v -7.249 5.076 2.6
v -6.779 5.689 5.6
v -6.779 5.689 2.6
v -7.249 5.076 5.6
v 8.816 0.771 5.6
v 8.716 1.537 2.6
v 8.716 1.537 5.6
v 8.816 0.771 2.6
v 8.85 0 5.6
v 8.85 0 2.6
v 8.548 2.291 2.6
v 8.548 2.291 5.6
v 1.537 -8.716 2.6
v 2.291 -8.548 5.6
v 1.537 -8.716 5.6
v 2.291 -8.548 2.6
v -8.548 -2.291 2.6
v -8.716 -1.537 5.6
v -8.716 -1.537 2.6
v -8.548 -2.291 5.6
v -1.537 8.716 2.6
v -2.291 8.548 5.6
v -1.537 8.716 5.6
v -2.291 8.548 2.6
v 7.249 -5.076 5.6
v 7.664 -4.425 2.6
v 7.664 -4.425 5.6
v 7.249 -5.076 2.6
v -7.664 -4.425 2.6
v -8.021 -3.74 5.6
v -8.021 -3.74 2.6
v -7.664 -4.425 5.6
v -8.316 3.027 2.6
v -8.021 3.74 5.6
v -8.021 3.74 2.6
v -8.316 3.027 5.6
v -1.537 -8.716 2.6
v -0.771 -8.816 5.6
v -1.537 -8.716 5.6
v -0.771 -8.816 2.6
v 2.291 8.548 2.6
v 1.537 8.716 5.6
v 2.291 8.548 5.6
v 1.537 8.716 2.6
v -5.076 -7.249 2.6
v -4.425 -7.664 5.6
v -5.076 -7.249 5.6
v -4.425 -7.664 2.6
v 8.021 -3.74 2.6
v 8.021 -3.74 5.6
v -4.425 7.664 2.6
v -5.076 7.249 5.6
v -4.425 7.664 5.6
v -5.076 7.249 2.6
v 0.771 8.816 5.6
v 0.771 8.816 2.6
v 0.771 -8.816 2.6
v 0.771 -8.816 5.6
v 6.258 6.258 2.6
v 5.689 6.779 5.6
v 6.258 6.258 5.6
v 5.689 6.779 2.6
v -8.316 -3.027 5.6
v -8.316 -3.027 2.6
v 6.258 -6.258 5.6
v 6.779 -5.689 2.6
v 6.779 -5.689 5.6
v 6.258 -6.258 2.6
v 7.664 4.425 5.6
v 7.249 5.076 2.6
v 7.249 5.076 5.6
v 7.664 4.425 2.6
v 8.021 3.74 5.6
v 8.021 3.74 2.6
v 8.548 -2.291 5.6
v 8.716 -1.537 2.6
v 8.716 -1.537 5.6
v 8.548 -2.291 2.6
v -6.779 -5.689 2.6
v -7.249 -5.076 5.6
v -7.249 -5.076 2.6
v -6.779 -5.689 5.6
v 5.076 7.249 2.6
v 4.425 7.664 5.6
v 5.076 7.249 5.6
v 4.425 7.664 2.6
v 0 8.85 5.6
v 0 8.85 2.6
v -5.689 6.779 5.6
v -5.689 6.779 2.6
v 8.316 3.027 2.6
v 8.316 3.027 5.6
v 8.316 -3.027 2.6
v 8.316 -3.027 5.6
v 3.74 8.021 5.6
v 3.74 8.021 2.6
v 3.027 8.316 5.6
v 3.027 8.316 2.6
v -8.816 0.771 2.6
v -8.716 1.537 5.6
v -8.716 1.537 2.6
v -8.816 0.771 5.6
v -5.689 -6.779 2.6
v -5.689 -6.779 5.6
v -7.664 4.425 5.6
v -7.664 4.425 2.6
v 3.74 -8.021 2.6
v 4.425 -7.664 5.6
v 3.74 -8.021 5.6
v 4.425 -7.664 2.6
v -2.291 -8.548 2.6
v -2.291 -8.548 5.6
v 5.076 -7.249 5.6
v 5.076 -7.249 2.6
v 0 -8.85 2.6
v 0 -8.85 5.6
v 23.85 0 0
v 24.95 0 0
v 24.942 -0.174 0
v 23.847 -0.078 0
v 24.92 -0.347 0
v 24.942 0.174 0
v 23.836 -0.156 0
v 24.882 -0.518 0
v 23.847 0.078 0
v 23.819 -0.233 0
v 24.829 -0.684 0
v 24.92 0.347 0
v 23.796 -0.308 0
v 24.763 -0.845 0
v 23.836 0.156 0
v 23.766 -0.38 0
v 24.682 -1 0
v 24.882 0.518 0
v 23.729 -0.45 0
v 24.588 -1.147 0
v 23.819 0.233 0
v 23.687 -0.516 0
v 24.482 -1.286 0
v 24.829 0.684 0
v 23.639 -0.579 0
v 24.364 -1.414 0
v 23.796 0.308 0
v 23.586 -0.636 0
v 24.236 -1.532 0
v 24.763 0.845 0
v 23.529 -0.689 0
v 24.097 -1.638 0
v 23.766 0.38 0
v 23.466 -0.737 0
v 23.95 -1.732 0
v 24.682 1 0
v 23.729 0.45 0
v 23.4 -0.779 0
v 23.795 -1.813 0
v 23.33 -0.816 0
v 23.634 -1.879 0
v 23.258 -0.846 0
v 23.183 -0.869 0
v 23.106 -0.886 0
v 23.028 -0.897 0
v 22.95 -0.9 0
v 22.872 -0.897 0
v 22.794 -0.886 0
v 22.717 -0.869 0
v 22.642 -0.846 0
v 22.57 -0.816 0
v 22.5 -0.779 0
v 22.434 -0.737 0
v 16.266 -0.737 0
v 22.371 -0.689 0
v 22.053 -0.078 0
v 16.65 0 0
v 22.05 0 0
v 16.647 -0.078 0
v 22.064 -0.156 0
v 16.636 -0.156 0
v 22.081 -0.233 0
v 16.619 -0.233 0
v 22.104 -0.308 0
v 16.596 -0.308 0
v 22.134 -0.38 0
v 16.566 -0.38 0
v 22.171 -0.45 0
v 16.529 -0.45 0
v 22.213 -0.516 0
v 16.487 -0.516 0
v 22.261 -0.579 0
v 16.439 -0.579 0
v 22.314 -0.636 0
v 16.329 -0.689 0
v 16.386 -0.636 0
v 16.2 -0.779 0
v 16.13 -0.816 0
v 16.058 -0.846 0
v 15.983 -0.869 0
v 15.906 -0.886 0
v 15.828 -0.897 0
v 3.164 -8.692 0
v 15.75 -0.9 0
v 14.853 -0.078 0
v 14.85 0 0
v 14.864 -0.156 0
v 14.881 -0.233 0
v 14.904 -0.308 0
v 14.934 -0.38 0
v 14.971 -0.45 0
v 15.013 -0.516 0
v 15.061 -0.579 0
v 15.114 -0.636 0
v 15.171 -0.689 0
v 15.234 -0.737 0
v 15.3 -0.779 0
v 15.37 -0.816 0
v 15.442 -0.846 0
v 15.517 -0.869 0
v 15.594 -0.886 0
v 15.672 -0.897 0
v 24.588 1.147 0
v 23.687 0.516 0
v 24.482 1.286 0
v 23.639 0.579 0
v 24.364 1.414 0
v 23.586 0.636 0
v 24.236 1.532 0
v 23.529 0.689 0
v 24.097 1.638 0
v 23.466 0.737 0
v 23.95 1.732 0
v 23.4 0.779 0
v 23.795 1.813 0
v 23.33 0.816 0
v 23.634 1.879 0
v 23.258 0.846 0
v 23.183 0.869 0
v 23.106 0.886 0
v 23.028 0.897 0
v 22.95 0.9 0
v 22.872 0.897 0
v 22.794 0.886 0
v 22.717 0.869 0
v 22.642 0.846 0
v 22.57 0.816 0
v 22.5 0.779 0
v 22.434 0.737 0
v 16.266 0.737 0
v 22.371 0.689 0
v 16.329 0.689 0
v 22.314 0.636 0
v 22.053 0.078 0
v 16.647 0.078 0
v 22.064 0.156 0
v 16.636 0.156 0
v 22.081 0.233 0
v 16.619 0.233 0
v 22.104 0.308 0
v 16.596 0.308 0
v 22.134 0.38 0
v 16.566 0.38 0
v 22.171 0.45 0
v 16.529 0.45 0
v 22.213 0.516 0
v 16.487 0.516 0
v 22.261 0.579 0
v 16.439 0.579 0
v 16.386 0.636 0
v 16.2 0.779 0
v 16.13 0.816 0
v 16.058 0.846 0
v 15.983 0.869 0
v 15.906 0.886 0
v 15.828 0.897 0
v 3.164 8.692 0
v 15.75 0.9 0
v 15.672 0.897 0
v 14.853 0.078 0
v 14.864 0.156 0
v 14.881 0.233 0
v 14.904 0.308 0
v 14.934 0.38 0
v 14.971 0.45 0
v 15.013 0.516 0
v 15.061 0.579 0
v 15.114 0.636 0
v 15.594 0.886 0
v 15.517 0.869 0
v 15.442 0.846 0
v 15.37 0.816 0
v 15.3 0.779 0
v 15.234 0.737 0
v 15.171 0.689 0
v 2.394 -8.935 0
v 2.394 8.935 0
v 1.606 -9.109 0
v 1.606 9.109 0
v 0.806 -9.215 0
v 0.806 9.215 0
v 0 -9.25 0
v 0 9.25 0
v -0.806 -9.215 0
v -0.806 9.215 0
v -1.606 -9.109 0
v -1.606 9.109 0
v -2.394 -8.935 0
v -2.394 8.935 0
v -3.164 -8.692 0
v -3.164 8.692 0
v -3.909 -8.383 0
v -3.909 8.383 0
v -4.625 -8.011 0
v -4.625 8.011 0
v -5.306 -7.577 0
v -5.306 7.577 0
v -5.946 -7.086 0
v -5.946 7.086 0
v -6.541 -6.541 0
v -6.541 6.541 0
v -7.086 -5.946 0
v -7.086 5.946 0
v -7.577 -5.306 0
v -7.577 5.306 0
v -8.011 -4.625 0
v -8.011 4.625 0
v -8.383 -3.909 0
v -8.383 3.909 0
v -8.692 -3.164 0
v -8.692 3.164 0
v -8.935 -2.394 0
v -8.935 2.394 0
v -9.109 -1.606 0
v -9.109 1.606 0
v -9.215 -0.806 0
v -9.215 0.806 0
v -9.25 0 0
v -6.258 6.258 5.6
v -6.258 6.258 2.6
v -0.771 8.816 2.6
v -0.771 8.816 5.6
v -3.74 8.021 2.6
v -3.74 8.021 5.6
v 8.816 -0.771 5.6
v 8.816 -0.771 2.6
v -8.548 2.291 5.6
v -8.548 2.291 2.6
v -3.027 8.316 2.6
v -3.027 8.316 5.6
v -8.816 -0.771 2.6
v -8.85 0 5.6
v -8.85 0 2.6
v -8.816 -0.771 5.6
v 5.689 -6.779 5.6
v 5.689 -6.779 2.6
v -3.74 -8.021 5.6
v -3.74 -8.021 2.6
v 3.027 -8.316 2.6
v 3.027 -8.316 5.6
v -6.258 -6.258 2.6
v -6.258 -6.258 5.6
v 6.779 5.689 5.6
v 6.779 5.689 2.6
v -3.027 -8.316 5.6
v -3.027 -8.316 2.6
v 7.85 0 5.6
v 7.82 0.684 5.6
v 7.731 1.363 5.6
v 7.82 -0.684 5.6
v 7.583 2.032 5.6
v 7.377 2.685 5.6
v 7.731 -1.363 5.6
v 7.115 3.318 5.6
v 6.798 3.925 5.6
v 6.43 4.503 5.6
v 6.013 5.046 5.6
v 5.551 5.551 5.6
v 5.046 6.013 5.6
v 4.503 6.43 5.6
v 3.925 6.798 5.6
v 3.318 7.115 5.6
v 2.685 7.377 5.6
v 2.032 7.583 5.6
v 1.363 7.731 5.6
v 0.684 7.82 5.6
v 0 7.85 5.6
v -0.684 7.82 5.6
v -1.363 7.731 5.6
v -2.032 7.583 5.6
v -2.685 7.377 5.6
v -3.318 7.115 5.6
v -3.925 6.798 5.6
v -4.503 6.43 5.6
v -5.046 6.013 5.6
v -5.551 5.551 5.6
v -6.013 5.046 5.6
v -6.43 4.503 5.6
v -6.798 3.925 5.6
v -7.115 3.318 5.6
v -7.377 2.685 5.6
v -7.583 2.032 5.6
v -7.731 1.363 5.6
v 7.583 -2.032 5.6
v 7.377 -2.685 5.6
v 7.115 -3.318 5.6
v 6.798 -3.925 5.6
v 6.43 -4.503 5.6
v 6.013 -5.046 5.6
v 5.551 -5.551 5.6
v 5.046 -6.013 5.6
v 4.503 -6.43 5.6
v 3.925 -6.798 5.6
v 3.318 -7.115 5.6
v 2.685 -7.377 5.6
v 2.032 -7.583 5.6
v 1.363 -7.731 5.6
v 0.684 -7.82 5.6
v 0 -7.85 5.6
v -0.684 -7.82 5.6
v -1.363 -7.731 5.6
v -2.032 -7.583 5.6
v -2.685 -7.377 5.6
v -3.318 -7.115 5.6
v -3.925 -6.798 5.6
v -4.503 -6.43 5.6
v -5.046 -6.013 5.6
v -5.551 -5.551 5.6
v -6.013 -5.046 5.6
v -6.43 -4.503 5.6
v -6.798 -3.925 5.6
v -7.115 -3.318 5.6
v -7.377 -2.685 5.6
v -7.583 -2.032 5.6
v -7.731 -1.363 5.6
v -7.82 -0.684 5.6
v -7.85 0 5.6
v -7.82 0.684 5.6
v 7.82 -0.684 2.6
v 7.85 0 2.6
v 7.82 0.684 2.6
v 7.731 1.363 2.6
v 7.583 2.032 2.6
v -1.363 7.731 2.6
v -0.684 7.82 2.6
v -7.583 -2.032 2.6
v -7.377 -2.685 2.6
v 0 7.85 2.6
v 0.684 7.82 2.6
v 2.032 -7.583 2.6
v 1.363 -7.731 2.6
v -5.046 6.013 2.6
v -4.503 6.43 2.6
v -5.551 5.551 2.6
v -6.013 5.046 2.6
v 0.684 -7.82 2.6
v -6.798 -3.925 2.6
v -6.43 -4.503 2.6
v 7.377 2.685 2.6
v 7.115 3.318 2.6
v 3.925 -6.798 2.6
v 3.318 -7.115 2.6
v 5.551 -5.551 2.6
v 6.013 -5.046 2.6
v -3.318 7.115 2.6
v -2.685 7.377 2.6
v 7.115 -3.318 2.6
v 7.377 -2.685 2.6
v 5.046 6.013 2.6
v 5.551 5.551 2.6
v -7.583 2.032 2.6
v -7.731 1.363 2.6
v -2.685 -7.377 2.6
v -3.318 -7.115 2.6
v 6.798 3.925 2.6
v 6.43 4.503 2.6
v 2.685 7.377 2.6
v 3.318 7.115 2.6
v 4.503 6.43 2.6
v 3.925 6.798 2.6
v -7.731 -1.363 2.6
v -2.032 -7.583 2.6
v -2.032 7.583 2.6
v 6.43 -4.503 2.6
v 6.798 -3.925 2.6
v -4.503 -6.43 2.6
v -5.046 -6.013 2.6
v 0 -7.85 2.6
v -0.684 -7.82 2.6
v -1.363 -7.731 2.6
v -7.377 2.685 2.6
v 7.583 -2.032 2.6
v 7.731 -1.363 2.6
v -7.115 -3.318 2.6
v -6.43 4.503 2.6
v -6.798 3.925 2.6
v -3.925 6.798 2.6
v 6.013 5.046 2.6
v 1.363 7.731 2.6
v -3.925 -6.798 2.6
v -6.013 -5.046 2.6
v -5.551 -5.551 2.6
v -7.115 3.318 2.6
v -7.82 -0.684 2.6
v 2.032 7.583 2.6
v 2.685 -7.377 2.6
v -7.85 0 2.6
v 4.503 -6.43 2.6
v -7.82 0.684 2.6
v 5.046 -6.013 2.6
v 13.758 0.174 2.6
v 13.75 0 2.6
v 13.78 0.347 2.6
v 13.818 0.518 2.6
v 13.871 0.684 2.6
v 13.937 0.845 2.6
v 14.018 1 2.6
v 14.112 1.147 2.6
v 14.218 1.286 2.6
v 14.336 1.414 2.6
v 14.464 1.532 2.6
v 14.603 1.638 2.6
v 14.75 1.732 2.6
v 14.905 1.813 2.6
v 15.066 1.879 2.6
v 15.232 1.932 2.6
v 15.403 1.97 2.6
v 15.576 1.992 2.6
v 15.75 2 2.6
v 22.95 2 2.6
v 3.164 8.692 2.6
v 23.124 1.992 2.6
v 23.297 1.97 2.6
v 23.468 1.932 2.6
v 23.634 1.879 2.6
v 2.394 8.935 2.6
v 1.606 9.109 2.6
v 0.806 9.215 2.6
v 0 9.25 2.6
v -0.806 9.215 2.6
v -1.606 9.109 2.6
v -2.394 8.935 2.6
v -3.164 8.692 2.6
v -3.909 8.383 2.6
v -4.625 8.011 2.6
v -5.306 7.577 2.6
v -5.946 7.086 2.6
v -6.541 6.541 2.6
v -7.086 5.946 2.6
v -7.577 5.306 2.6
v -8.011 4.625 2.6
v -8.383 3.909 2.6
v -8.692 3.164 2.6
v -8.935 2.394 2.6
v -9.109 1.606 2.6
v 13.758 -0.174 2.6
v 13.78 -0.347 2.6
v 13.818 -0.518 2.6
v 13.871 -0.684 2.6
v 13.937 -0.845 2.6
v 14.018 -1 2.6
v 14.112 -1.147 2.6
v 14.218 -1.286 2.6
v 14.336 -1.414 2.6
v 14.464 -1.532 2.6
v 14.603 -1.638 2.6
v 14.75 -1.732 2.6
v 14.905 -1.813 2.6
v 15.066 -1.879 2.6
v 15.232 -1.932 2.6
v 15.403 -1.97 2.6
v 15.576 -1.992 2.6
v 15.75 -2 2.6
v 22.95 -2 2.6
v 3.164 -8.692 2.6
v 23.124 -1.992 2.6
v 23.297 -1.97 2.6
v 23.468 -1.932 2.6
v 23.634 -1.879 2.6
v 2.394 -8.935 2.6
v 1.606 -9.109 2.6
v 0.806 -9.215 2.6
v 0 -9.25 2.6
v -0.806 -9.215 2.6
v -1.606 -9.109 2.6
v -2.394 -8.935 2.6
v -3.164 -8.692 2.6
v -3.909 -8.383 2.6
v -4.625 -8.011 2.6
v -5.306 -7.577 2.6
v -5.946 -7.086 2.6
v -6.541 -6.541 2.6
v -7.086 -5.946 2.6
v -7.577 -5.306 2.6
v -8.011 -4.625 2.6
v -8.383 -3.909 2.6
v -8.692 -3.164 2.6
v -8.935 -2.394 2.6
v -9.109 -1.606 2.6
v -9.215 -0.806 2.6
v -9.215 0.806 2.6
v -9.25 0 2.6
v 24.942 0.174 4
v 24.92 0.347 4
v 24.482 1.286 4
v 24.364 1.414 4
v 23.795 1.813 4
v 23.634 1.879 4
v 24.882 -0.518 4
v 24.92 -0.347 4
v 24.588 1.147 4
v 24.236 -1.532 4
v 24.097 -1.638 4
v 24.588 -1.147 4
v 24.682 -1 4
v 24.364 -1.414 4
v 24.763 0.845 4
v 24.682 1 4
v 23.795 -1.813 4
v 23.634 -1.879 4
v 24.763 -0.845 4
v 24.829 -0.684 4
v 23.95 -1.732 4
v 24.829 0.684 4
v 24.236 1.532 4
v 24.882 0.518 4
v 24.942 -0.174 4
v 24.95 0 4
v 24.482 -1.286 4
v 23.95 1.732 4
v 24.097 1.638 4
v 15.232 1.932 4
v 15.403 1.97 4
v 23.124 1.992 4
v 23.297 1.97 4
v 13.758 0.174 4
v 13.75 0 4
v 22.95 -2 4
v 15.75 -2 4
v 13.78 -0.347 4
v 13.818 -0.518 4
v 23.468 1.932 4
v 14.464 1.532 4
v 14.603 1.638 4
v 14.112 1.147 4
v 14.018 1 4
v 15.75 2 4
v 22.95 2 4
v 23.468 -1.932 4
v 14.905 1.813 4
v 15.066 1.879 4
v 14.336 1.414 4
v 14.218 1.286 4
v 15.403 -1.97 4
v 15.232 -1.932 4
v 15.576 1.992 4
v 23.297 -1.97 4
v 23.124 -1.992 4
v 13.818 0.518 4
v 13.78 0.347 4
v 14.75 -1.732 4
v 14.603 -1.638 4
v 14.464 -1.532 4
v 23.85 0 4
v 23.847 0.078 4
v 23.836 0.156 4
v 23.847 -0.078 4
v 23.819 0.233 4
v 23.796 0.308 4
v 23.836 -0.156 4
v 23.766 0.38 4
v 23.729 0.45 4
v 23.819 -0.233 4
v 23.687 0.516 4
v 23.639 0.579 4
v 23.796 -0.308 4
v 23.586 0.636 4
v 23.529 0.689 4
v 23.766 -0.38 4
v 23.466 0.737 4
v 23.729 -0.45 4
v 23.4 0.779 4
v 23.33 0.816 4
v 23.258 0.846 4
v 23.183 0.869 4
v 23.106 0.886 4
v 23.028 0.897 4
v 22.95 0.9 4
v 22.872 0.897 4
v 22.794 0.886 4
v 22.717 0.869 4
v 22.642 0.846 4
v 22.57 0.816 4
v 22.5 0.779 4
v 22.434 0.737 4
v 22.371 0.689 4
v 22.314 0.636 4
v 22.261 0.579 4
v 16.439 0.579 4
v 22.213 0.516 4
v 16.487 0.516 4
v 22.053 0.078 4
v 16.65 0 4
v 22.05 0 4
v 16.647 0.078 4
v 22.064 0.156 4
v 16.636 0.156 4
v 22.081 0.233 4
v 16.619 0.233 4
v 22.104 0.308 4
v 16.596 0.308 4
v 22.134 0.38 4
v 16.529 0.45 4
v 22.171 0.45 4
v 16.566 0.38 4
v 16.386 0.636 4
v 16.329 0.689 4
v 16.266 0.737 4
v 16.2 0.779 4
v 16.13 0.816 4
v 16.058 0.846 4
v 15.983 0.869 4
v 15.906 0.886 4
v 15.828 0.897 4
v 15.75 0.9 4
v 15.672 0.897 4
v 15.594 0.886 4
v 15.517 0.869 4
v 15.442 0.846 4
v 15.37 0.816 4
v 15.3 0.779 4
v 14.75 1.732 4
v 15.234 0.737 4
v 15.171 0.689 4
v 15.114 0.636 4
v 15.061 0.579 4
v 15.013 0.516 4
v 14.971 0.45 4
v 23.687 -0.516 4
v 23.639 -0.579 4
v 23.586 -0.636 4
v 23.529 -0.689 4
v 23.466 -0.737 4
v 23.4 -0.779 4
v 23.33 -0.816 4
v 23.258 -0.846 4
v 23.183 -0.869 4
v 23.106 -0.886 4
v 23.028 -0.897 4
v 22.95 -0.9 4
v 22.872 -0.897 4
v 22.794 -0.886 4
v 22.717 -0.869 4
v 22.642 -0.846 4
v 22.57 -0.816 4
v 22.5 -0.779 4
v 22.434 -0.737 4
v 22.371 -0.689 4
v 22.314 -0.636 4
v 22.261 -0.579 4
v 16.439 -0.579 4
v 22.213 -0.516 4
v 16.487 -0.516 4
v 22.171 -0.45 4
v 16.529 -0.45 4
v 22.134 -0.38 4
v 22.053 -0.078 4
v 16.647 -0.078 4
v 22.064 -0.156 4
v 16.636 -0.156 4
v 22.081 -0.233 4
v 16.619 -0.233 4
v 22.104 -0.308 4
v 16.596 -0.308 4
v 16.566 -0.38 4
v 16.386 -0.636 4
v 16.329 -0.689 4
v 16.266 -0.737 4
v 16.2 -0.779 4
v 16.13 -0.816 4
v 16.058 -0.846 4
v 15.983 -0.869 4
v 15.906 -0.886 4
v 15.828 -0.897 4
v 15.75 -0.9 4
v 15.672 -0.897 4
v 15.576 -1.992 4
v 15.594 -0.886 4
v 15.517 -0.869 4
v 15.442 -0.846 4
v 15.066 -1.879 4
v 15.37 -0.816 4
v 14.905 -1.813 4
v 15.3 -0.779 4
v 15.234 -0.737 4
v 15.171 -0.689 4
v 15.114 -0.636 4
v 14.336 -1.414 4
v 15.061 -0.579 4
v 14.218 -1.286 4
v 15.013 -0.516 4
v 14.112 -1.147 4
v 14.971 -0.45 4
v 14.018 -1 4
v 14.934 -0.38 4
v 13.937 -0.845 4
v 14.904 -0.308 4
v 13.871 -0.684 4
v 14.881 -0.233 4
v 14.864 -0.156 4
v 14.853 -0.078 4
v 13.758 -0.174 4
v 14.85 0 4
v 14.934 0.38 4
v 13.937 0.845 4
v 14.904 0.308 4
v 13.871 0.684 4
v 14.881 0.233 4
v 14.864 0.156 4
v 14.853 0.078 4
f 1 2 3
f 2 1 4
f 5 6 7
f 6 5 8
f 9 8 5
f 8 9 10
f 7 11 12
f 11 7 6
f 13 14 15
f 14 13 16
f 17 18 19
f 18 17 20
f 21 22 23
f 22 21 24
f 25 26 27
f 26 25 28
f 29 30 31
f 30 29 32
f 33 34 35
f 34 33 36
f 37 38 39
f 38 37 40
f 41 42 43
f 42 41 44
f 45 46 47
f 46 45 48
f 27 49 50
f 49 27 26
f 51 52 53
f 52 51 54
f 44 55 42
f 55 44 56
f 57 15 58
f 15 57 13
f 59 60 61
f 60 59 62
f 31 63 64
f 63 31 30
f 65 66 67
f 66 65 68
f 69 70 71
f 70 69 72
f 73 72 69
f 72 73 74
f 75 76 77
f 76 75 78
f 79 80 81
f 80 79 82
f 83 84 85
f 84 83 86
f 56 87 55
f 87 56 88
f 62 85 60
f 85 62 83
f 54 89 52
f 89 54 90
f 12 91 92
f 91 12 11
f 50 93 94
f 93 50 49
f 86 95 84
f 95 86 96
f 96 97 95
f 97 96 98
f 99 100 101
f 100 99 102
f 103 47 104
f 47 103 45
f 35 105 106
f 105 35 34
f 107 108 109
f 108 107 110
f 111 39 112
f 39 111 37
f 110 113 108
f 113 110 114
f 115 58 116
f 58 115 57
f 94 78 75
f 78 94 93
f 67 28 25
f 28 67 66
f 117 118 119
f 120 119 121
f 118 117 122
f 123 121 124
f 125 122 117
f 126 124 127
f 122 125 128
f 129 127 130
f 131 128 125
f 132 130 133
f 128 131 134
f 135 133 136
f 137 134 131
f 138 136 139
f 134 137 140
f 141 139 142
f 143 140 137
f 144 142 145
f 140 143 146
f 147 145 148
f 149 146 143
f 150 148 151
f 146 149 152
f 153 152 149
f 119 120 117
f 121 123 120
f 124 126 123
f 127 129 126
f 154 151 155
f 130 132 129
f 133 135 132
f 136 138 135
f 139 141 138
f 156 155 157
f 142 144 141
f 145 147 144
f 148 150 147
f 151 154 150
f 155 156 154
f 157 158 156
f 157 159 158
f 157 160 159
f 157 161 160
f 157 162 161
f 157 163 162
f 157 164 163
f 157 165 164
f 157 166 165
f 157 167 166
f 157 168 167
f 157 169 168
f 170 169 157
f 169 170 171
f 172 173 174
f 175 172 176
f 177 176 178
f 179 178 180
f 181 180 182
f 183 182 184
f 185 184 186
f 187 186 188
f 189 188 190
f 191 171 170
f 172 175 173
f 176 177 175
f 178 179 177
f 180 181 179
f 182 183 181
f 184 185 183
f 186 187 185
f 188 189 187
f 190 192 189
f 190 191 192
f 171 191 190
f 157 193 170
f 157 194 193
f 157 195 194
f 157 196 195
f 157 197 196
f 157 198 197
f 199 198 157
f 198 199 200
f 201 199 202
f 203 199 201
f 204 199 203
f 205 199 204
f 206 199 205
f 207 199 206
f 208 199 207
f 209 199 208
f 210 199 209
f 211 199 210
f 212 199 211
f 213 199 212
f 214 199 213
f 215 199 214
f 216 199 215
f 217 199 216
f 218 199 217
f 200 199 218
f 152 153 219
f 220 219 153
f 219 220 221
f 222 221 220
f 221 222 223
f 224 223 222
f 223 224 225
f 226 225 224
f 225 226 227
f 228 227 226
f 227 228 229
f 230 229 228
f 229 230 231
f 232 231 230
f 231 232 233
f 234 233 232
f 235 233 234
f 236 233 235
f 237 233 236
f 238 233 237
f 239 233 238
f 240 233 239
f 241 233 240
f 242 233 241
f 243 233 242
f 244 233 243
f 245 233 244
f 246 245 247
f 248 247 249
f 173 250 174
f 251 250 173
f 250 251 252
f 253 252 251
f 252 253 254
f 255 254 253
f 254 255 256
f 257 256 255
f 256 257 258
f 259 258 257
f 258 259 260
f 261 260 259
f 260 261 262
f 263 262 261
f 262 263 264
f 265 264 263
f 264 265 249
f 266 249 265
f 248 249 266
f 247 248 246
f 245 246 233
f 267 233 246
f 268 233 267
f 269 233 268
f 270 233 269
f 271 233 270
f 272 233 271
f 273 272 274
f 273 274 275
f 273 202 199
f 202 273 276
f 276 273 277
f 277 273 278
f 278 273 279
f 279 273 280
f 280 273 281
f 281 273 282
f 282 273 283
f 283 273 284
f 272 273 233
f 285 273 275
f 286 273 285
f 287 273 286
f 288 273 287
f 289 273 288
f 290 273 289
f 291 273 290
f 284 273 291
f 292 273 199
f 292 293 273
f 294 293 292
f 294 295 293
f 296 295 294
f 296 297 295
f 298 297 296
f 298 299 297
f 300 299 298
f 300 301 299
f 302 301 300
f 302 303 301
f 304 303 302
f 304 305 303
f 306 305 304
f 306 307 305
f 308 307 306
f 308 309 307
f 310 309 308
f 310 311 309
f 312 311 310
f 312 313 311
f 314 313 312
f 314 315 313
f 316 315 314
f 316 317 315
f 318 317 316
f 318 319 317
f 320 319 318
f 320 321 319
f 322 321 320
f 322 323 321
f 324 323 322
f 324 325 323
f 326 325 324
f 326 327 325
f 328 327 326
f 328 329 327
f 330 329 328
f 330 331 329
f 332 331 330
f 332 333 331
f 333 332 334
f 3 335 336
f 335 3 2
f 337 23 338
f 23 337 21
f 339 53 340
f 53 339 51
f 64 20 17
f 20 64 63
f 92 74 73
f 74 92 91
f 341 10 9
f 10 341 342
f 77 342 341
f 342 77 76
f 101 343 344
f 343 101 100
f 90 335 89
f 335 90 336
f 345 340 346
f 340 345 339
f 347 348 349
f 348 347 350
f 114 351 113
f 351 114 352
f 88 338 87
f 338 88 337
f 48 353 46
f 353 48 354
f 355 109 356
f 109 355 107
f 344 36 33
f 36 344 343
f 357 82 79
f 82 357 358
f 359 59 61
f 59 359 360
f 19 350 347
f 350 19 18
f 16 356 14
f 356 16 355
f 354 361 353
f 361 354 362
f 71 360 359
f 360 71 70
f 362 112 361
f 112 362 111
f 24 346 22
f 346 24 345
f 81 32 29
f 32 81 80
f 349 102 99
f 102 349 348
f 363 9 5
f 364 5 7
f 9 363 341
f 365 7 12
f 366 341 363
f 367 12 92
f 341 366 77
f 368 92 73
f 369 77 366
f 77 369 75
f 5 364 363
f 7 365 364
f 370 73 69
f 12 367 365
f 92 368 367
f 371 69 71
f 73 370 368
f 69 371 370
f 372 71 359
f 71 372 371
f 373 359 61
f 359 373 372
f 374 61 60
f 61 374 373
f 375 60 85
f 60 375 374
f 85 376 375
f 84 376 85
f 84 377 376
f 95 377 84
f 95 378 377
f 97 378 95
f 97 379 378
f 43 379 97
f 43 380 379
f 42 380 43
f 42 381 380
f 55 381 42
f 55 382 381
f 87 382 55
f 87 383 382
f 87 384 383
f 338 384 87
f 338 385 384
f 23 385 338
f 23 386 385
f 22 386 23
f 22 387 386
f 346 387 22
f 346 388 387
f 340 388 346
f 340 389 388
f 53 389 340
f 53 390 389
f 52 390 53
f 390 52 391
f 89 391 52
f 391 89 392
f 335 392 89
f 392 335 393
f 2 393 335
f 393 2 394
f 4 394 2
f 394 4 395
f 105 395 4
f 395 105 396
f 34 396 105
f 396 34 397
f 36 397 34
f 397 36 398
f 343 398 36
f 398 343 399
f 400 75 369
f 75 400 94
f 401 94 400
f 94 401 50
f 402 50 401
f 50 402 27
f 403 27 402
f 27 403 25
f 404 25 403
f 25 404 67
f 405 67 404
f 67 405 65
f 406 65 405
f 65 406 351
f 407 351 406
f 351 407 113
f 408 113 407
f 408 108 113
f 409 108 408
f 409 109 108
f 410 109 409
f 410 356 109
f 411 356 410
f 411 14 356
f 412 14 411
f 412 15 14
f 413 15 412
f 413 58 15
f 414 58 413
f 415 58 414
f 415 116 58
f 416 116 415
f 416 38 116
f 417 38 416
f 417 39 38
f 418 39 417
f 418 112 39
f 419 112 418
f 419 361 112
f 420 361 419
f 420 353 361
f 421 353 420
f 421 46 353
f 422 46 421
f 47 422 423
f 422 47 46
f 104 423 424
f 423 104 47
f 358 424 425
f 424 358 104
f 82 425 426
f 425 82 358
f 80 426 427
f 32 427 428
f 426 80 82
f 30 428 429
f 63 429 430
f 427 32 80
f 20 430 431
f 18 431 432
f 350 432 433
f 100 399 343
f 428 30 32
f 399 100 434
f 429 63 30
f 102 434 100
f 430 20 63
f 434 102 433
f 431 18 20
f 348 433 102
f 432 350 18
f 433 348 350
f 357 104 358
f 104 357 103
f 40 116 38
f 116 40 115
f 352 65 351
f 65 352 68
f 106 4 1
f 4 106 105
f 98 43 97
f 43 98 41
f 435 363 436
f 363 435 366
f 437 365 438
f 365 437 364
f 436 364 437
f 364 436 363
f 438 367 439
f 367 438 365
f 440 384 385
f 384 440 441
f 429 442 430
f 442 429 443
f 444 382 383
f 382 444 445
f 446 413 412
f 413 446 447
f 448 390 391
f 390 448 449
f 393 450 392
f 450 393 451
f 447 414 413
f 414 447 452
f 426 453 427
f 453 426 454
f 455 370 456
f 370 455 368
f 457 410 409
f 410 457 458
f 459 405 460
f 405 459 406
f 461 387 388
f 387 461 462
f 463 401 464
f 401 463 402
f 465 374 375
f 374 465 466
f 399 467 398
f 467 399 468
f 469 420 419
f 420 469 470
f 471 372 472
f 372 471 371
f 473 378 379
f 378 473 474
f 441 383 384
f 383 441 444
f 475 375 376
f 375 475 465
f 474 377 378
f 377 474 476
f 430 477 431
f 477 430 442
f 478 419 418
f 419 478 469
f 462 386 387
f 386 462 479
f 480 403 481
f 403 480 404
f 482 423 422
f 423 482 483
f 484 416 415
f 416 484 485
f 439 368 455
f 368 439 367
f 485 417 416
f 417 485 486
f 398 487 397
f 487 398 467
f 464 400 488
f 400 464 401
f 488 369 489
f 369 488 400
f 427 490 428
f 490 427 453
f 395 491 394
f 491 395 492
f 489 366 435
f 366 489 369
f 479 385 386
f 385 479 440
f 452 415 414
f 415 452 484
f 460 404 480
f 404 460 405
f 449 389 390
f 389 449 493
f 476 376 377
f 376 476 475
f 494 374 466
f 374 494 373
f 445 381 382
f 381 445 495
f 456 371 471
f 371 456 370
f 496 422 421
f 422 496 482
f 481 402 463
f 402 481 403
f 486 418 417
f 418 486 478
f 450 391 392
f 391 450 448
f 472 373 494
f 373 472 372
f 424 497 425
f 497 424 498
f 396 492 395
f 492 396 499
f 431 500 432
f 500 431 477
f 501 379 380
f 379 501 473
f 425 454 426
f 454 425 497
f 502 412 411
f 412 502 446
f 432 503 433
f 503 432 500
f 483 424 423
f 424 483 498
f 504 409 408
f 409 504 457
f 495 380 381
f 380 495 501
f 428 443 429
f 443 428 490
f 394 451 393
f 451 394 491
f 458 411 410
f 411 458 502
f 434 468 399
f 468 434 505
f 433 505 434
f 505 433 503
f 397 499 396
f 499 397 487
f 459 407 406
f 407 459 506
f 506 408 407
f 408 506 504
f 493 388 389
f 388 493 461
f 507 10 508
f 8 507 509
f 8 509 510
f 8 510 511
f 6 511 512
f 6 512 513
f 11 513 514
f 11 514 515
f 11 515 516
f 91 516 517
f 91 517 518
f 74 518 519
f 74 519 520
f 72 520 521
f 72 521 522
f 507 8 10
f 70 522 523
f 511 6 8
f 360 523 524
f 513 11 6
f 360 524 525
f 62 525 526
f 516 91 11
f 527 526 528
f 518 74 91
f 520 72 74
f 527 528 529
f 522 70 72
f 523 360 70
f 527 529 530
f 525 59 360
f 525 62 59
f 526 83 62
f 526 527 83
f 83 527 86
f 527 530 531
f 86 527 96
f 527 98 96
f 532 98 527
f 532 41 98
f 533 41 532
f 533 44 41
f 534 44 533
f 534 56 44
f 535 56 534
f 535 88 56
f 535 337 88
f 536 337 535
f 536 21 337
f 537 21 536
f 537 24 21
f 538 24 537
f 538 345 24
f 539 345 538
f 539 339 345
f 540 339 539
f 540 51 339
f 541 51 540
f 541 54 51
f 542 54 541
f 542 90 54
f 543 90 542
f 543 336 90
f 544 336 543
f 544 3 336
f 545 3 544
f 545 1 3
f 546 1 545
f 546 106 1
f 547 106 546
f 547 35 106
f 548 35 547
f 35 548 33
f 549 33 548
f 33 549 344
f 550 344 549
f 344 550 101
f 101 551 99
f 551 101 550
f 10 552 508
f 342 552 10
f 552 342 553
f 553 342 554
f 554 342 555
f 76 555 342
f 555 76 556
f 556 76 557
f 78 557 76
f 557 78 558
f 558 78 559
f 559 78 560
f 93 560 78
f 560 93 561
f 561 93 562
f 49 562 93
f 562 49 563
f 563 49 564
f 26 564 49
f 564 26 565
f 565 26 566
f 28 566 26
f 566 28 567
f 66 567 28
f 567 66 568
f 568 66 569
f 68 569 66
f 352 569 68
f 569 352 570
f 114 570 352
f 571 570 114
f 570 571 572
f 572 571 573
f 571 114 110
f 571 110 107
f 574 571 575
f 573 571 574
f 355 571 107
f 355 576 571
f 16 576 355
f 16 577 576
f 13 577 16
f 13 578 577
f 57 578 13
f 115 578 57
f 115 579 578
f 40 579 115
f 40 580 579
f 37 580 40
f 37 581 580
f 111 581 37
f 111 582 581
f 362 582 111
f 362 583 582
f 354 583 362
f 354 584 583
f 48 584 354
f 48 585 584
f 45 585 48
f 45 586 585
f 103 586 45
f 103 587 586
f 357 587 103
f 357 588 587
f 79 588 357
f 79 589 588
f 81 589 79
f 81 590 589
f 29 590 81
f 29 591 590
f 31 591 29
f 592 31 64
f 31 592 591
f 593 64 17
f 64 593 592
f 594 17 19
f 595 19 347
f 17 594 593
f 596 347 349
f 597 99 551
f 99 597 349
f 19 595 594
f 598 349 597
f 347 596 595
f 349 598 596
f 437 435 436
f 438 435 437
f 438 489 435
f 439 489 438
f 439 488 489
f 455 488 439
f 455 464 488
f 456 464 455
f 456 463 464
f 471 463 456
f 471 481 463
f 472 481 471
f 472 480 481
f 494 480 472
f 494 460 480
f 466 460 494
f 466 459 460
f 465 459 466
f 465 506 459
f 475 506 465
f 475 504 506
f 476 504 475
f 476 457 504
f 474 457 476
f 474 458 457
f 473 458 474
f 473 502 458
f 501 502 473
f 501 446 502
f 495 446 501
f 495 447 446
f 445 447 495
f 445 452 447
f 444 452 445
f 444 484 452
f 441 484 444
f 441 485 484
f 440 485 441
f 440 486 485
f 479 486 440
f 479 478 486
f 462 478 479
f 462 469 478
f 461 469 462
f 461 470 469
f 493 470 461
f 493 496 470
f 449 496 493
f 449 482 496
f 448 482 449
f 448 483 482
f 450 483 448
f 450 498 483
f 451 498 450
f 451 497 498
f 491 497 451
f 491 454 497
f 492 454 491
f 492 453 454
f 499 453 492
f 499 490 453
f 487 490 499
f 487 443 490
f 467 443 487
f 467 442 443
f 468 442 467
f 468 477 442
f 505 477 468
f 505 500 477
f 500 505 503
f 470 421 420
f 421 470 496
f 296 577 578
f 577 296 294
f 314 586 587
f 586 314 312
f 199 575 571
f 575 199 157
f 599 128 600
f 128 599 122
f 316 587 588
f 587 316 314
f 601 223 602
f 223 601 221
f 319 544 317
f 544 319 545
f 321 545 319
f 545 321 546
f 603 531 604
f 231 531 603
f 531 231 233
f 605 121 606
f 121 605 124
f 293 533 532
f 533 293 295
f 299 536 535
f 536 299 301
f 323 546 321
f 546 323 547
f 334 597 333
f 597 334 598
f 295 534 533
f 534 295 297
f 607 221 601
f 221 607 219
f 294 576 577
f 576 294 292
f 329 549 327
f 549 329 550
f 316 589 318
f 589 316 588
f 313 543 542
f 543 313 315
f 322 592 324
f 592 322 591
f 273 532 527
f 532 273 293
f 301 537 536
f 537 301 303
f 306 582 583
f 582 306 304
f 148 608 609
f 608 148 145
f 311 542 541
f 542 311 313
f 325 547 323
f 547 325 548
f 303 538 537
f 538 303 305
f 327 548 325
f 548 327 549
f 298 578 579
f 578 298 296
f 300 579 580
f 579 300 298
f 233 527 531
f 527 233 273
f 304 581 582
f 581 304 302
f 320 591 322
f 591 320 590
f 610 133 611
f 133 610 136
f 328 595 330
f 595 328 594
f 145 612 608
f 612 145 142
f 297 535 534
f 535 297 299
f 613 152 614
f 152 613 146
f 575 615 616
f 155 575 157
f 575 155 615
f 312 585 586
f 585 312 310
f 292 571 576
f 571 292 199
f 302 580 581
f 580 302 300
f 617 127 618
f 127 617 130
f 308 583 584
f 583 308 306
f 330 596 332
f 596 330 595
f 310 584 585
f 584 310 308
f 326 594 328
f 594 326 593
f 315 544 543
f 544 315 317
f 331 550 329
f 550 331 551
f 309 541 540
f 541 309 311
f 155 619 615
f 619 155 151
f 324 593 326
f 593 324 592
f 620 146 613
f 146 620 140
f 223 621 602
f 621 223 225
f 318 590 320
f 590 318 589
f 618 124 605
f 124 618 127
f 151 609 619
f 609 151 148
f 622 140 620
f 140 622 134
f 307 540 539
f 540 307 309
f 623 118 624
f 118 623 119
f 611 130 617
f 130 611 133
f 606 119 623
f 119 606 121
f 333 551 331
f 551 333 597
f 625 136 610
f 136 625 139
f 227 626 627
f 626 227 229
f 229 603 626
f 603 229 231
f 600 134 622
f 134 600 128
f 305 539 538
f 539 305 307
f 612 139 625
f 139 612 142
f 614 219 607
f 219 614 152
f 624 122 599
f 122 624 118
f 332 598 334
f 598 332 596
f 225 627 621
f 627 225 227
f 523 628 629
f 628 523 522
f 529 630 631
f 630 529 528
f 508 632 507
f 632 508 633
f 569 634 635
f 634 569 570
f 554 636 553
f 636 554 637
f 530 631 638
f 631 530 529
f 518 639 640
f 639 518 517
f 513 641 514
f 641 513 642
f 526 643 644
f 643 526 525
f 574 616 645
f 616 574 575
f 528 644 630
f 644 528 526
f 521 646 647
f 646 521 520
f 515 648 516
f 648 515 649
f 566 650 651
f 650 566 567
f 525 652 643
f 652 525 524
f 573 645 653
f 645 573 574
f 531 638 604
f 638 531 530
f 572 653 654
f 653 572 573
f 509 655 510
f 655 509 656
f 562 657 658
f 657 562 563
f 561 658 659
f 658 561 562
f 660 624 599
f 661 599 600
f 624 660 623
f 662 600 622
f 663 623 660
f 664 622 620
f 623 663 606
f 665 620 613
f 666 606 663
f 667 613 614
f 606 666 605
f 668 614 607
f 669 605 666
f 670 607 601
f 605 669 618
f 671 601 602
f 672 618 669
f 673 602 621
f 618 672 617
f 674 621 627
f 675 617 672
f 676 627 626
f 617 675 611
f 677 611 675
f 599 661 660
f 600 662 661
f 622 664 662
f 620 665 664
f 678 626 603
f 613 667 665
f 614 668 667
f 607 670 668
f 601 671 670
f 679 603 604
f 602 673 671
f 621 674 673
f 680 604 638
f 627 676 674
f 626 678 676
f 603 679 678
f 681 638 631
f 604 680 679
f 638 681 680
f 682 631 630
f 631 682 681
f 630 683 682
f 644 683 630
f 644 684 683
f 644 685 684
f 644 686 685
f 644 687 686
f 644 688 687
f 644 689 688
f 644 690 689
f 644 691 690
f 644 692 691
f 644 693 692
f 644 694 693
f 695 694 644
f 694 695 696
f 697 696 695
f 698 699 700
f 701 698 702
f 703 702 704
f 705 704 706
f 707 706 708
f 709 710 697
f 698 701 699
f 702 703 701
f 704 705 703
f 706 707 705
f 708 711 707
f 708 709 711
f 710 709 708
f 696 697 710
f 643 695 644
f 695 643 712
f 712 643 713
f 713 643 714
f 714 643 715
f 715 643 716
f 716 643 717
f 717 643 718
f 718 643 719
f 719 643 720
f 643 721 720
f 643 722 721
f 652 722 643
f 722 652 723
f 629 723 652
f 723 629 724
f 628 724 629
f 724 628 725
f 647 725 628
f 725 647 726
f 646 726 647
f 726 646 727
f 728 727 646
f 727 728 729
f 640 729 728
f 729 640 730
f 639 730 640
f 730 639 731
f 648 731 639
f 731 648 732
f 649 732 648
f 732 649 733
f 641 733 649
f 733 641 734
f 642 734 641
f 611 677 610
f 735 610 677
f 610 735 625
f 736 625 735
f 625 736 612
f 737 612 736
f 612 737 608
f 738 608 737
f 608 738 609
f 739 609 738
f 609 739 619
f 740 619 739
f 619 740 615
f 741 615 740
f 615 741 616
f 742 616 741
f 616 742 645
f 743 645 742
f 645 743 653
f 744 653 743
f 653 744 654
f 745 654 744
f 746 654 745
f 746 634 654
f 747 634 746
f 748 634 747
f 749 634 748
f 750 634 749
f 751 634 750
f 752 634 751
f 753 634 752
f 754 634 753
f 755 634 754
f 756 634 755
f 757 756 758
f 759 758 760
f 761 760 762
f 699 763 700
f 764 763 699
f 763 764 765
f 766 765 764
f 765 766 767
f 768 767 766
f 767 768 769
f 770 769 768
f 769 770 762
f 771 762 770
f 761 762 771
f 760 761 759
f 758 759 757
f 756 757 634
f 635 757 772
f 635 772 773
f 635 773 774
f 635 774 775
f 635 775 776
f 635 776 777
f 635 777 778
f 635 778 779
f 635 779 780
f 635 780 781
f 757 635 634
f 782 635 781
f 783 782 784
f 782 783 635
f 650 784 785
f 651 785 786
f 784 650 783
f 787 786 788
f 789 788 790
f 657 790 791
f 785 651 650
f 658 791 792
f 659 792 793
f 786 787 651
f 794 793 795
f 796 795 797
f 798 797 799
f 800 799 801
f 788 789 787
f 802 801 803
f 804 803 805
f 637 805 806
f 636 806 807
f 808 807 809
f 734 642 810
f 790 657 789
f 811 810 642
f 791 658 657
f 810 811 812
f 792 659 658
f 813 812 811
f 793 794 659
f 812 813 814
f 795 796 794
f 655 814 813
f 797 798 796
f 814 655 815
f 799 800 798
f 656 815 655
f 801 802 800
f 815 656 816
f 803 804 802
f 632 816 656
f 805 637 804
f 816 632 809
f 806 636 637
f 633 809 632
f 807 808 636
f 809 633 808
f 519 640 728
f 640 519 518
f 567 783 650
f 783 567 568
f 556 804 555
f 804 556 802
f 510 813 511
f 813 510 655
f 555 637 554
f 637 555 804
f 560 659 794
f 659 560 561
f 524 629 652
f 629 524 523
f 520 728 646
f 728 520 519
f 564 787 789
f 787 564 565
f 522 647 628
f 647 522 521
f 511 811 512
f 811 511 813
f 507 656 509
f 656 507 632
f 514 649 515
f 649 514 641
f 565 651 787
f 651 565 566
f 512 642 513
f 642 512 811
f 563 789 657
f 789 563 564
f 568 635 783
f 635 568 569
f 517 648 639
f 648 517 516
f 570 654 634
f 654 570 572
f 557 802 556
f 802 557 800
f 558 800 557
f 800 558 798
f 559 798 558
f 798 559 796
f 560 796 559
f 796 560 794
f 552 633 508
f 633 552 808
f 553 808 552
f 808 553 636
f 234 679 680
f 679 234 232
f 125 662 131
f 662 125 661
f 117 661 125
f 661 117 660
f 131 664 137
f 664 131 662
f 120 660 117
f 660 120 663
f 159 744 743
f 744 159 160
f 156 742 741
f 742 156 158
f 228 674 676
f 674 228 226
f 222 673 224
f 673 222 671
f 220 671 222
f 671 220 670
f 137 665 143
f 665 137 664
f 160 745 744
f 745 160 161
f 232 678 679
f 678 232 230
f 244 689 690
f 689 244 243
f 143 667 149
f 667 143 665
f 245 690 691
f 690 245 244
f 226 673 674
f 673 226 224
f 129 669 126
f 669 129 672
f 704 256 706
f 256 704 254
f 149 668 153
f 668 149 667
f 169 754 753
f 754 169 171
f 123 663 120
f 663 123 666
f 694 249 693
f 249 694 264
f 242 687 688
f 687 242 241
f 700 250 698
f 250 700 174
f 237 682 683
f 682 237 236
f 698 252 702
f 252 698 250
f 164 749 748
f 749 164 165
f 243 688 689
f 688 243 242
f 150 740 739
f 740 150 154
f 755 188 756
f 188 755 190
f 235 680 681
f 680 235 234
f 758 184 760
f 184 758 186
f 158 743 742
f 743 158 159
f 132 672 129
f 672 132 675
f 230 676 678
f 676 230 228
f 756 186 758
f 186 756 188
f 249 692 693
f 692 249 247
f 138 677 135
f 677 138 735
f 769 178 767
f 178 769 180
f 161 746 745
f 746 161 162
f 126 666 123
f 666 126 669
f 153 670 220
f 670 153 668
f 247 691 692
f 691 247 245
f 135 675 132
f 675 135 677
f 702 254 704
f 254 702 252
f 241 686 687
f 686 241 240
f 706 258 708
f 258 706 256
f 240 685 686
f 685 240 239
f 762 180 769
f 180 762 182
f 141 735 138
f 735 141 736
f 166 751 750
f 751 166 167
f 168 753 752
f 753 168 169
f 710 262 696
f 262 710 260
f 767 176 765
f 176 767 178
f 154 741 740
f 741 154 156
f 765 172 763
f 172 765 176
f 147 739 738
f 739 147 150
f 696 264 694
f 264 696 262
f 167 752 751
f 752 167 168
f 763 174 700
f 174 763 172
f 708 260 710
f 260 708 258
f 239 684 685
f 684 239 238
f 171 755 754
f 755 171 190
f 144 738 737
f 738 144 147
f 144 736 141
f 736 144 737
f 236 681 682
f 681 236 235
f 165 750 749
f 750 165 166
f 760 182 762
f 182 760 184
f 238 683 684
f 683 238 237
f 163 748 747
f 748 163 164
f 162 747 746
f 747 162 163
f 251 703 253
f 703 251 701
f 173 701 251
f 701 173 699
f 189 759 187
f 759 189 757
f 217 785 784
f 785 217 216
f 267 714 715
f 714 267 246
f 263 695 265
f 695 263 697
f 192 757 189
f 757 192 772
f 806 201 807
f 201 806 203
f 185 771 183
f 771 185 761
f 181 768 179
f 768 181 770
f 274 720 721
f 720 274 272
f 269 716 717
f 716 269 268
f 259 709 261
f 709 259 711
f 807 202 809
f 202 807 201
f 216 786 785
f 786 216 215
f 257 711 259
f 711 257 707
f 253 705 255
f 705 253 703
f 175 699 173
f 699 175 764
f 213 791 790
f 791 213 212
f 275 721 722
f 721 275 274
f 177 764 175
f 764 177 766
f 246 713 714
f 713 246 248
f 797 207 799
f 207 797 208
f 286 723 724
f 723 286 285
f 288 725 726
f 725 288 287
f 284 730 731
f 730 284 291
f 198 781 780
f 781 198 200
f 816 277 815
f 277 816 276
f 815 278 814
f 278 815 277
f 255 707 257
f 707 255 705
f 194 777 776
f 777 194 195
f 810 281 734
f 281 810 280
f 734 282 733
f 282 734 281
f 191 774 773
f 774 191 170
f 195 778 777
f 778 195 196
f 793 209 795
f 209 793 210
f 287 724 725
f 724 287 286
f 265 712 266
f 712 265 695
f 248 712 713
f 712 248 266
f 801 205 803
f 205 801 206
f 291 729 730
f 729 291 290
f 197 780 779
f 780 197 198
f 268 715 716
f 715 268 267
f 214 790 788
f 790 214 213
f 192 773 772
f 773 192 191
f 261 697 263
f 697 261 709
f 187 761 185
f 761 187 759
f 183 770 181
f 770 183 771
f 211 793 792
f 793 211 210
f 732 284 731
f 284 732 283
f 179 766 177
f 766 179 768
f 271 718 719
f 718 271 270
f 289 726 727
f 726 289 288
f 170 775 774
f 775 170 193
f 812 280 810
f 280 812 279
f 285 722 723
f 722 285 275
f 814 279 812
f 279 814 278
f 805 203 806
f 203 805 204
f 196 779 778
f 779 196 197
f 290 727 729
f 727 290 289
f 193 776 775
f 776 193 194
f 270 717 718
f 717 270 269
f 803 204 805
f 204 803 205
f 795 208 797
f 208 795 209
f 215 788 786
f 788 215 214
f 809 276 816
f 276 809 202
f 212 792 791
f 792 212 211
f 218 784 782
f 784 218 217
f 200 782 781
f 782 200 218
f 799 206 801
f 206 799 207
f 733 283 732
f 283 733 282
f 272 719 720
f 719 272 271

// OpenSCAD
// This is a replacement weight holder for a sonic shaking ghost toy.
//
// There were several different designs over generations of the toy,
// and this copies one of them, but should work for any.
//
// You will probably need to drill out the holes for a good fit.
// I found a 5/16 inch drill bit was about right.
//
// You'll need to glue an approximately 9 gram weight into the cup.

base_h = 2.6; // thickness of the main part
base_l = 34.2; // how long the part is in its longest dimension
big_d = 18.5; // diameter of the big circle at one end
small_d = 4; // diameter of the small circle at the other end

cup_od = 17.7; // outer diameter of the cup that holds the weight
cup_h = 5.6; // total height (including base plate) of the cup
cup_id = cup_od - 2; // inner diameter of the recess where weight sits

support_h = 4; // total height (including base) of the extra support ridge
support_d = 4; // width of the extra support ridge

hole1_x = base_l - 0.5*(big_d + small_d); // location of the first hole
hole2_offset = 7.2; // distance between the two holes
hole2_x = hole1_x - hole2_offset;

hole_d = 1.8; // diameter of the holes

$fn=72;
difference() {
  union() {
    hull() {
      cylinder(h=base_h, d=18.5);
      translate([hole1_x,0,0]) cylinder(h=base_h, d=4);
    }
    difference() {
      cylinder(h=cup_h, d=cup_od);
      translate([0,0,base_h]) cylinder(h=cup_h, d=cup_id);
    }
    hull() {
      translate([hole1_x,0,0]) cylinder(h=support_h, d=support_d);
      translate([hole2_x,0,0]) cylinder(h=support_h, d=support_d);
    }
  };
  translate([hole1_x,0,0]) cylinder(h=support_h, d=hole_d);
  translate([hole2_x,0,0]) cylinder(h=support_h, d=hole_d);
}
